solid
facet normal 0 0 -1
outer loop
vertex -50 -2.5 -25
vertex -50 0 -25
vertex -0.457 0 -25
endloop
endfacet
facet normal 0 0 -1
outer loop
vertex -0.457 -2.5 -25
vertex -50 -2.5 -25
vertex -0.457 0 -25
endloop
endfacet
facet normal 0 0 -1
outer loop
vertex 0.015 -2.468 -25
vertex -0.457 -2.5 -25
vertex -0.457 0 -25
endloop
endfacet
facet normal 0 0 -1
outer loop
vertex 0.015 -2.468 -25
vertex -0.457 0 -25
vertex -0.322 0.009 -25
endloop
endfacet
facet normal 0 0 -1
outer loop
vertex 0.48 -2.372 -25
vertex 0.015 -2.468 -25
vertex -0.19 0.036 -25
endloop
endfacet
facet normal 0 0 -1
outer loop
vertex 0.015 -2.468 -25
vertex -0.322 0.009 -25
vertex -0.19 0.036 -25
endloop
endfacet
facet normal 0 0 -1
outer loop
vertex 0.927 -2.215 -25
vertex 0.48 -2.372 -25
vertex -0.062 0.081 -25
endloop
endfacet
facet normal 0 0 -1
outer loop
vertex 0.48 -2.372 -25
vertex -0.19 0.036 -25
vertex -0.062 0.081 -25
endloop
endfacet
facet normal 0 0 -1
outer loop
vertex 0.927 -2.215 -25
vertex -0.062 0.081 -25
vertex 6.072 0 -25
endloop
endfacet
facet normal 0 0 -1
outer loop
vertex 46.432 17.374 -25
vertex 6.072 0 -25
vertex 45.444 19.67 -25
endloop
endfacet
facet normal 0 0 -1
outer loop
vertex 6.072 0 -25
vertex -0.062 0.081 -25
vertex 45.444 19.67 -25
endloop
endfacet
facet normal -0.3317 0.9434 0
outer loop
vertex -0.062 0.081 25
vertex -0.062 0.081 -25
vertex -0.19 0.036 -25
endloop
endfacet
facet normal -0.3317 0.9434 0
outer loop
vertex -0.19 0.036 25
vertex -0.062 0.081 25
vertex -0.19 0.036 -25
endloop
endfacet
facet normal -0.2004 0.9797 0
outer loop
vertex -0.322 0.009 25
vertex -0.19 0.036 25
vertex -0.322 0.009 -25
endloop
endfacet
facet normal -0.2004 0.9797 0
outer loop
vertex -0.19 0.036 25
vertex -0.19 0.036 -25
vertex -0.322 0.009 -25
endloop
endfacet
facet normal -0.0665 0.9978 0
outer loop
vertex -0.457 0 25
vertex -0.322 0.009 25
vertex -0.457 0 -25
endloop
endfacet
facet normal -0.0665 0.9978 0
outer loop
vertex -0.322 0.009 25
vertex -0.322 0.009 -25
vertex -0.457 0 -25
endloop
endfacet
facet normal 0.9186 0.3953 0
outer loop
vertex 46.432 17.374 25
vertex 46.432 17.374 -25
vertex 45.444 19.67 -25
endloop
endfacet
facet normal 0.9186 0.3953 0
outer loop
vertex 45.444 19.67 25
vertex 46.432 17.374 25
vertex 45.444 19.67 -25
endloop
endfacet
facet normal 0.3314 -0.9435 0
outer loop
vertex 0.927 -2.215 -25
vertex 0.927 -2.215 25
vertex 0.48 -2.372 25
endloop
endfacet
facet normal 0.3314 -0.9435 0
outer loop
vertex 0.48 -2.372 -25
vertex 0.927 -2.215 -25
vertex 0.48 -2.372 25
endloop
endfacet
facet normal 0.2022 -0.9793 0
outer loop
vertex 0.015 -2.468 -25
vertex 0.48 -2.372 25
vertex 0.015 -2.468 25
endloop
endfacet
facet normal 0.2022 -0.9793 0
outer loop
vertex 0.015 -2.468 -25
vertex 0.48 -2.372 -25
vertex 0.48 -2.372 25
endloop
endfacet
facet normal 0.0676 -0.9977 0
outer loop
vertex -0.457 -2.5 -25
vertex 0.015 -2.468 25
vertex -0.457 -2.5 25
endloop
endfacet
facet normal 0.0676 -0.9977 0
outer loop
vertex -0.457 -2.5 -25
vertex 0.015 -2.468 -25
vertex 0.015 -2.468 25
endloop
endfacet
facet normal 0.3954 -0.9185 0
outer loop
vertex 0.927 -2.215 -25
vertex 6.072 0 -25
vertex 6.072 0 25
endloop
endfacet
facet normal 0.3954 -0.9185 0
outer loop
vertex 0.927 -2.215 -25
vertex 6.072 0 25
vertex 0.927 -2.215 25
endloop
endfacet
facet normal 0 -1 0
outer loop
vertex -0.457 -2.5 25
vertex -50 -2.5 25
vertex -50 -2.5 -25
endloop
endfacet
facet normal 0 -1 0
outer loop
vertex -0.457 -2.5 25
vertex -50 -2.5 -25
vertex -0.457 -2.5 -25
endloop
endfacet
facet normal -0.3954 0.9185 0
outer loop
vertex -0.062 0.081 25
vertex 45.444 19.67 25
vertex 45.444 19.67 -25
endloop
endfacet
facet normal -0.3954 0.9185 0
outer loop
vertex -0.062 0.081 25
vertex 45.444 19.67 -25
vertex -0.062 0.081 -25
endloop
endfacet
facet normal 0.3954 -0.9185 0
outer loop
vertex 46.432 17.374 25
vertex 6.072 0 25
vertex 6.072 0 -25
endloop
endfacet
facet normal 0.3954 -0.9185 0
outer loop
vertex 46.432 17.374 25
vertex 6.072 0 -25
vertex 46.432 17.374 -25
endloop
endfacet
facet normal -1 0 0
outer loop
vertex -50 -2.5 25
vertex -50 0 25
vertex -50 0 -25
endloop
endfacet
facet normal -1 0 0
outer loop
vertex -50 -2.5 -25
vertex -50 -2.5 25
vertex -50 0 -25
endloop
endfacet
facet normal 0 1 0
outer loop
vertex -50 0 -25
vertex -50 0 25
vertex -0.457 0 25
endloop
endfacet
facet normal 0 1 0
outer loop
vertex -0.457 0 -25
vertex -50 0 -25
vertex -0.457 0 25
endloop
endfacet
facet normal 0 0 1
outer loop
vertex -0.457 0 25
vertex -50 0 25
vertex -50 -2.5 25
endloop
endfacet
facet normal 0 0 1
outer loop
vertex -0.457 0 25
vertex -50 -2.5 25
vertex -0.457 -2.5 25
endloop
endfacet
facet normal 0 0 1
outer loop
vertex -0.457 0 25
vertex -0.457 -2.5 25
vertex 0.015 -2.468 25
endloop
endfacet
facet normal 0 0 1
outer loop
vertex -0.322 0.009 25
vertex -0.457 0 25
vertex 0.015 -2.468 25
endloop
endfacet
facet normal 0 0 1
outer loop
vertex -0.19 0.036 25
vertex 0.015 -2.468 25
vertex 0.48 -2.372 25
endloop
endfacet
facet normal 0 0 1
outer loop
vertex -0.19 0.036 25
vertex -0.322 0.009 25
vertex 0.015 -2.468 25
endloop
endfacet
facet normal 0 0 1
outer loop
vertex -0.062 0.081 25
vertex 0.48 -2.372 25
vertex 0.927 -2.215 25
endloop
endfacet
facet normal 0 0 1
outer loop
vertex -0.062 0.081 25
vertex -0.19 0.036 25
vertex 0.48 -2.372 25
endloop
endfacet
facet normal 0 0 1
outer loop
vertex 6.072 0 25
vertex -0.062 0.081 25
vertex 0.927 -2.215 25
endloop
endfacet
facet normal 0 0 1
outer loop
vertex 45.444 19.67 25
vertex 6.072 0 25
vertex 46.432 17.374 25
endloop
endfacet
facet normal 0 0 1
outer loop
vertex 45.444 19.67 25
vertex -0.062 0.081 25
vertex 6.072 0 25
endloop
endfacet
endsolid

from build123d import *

# Parameters (mm, degrees)
SKETCH1_W              = 100
SKETCH1_H              = 50
BASE_FLANGE1_DEPTH     = 2.5
SKETCHED_START         = -25
SKETCHED_BEND3_DEPTH   = 50
SKETCHED_BEND3_2_DEPTH = 50


# Read off the part's stored shape, not the designer's step: Sketched Bend3
# Sheet-metal steps are written as plain solids
with BuildPart() as part:
    # Sketch1 → Base-Flange1 (new body)
    with BuildSketch(Plane(origin=(0, 0, 0), x_dir=(1, 0, 0), z_dir=(0, 1, 0))):
        Rectangle(SKETCH1_W, SKETCH1_H)
    extrude(amount=-BASE_FLANGE1_DEPTH)

    # Sketched Bend3 outline → Sketched Bend3 (cut)
    with BuildSketch(Plane.XY.offset(SKETCHED_START)):
        with BuildLine():
            Line((50, 0), (6.071738955, 0))
            Line((6.071738955, 0), (0.92655011, -2.214803911))
            ThreePointArc((0.92655011, -2.214803911), (0.249167174, -2.427959574), (-0.457298081, -2.5))
            Line((-0.457298081, -2.5), (50, -2.5))
            Line((50, -2.5), (50, 0))
        make_face()
    extrude(amount=SKETCHED_BEND3_DEPTH, mode=Mode.SUBTRACT)

    # Sketched Bend3 2 outline → Sketched Bend3 2 (add)
    with BuildSketch(Plane.XY.offset(SKETCHED_START)):
        with BuildLine():
            Line((46.432284933, 17.373647068), (45.443821939, 19.669935575))
            Line((45.443821939, 19.669935575), (-0.061912883, 0.081484597))
            ThreePointArc((-0.061912883, 0.081484597), (-0.255450865, 0.020582979), (-0.457298081, 0))
            Line((-0.457298081, 0), (6.071738955, 0))
            Line((6.071738955, 0), (46.432284933, 17.373647068))
        make_face()
    extrude(amount=SKETCHED_BEND3_2_DEPTH)


solid = part.part
